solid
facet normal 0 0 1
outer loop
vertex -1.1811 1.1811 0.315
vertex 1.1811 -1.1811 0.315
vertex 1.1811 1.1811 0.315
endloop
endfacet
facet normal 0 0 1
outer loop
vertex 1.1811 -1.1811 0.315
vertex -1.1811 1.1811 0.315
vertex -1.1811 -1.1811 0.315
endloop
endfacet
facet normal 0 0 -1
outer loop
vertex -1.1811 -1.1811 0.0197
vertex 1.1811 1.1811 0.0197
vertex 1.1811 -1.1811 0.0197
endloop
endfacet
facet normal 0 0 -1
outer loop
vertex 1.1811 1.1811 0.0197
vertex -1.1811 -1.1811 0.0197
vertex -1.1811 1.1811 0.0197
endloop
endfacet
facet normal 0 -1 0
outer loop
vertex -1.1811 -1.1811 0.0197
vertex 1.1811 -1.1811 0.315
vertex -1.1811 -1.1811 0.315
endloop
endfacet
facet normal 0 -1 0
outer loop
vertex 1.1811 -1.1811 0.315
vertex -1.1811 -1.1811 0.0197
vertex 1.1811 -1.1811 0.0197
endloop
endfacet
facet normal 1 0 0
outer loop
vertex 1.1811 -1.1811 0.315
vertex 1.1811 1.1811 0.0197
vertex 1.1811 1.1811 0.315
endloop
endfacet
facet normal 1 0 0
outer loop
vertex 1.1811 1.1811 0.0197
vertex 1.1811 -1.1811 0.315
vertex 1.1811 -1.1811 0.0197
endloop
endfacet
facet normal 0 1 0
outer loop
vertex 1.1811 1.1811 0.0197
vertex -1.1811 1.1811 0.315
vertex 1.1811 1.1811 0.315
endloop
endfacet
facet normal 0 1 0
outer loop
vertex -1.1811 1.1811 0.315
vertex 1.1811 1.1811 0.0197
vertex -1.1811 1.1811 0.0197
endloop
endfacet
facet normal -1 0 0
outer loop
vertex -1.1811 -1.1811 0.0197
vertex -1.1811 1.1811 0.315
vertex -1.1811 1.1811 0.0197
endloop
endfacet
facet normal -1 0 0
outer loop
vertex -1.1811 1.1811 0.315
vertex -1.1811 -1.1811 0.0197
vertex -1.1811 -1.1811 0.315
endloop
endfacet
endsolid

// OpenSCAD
// file: defines.scad
scale = 1/2.54;

N = 44;
ND = 12;
NE = 10;
e = 0.50;
A = 0.80;   // 0.80..1.00
A1 = 0.05;  // 0.025..0.075
E = 6.00;
E2 = 4.55;  // 4.40..4.70
D = 6.00;
D2 = 4.55;  // 4.40..4.70
b = 0.25;   // 0.20..0.30
L = 0.25;   // 0.20..0.30
K = 0.20;   //
// main file
include <defines.scad>

scale(scale)
  translate([0, 0, (A - A1) / 2 + A1])
    cube([D, E, A - A1], center = true);
